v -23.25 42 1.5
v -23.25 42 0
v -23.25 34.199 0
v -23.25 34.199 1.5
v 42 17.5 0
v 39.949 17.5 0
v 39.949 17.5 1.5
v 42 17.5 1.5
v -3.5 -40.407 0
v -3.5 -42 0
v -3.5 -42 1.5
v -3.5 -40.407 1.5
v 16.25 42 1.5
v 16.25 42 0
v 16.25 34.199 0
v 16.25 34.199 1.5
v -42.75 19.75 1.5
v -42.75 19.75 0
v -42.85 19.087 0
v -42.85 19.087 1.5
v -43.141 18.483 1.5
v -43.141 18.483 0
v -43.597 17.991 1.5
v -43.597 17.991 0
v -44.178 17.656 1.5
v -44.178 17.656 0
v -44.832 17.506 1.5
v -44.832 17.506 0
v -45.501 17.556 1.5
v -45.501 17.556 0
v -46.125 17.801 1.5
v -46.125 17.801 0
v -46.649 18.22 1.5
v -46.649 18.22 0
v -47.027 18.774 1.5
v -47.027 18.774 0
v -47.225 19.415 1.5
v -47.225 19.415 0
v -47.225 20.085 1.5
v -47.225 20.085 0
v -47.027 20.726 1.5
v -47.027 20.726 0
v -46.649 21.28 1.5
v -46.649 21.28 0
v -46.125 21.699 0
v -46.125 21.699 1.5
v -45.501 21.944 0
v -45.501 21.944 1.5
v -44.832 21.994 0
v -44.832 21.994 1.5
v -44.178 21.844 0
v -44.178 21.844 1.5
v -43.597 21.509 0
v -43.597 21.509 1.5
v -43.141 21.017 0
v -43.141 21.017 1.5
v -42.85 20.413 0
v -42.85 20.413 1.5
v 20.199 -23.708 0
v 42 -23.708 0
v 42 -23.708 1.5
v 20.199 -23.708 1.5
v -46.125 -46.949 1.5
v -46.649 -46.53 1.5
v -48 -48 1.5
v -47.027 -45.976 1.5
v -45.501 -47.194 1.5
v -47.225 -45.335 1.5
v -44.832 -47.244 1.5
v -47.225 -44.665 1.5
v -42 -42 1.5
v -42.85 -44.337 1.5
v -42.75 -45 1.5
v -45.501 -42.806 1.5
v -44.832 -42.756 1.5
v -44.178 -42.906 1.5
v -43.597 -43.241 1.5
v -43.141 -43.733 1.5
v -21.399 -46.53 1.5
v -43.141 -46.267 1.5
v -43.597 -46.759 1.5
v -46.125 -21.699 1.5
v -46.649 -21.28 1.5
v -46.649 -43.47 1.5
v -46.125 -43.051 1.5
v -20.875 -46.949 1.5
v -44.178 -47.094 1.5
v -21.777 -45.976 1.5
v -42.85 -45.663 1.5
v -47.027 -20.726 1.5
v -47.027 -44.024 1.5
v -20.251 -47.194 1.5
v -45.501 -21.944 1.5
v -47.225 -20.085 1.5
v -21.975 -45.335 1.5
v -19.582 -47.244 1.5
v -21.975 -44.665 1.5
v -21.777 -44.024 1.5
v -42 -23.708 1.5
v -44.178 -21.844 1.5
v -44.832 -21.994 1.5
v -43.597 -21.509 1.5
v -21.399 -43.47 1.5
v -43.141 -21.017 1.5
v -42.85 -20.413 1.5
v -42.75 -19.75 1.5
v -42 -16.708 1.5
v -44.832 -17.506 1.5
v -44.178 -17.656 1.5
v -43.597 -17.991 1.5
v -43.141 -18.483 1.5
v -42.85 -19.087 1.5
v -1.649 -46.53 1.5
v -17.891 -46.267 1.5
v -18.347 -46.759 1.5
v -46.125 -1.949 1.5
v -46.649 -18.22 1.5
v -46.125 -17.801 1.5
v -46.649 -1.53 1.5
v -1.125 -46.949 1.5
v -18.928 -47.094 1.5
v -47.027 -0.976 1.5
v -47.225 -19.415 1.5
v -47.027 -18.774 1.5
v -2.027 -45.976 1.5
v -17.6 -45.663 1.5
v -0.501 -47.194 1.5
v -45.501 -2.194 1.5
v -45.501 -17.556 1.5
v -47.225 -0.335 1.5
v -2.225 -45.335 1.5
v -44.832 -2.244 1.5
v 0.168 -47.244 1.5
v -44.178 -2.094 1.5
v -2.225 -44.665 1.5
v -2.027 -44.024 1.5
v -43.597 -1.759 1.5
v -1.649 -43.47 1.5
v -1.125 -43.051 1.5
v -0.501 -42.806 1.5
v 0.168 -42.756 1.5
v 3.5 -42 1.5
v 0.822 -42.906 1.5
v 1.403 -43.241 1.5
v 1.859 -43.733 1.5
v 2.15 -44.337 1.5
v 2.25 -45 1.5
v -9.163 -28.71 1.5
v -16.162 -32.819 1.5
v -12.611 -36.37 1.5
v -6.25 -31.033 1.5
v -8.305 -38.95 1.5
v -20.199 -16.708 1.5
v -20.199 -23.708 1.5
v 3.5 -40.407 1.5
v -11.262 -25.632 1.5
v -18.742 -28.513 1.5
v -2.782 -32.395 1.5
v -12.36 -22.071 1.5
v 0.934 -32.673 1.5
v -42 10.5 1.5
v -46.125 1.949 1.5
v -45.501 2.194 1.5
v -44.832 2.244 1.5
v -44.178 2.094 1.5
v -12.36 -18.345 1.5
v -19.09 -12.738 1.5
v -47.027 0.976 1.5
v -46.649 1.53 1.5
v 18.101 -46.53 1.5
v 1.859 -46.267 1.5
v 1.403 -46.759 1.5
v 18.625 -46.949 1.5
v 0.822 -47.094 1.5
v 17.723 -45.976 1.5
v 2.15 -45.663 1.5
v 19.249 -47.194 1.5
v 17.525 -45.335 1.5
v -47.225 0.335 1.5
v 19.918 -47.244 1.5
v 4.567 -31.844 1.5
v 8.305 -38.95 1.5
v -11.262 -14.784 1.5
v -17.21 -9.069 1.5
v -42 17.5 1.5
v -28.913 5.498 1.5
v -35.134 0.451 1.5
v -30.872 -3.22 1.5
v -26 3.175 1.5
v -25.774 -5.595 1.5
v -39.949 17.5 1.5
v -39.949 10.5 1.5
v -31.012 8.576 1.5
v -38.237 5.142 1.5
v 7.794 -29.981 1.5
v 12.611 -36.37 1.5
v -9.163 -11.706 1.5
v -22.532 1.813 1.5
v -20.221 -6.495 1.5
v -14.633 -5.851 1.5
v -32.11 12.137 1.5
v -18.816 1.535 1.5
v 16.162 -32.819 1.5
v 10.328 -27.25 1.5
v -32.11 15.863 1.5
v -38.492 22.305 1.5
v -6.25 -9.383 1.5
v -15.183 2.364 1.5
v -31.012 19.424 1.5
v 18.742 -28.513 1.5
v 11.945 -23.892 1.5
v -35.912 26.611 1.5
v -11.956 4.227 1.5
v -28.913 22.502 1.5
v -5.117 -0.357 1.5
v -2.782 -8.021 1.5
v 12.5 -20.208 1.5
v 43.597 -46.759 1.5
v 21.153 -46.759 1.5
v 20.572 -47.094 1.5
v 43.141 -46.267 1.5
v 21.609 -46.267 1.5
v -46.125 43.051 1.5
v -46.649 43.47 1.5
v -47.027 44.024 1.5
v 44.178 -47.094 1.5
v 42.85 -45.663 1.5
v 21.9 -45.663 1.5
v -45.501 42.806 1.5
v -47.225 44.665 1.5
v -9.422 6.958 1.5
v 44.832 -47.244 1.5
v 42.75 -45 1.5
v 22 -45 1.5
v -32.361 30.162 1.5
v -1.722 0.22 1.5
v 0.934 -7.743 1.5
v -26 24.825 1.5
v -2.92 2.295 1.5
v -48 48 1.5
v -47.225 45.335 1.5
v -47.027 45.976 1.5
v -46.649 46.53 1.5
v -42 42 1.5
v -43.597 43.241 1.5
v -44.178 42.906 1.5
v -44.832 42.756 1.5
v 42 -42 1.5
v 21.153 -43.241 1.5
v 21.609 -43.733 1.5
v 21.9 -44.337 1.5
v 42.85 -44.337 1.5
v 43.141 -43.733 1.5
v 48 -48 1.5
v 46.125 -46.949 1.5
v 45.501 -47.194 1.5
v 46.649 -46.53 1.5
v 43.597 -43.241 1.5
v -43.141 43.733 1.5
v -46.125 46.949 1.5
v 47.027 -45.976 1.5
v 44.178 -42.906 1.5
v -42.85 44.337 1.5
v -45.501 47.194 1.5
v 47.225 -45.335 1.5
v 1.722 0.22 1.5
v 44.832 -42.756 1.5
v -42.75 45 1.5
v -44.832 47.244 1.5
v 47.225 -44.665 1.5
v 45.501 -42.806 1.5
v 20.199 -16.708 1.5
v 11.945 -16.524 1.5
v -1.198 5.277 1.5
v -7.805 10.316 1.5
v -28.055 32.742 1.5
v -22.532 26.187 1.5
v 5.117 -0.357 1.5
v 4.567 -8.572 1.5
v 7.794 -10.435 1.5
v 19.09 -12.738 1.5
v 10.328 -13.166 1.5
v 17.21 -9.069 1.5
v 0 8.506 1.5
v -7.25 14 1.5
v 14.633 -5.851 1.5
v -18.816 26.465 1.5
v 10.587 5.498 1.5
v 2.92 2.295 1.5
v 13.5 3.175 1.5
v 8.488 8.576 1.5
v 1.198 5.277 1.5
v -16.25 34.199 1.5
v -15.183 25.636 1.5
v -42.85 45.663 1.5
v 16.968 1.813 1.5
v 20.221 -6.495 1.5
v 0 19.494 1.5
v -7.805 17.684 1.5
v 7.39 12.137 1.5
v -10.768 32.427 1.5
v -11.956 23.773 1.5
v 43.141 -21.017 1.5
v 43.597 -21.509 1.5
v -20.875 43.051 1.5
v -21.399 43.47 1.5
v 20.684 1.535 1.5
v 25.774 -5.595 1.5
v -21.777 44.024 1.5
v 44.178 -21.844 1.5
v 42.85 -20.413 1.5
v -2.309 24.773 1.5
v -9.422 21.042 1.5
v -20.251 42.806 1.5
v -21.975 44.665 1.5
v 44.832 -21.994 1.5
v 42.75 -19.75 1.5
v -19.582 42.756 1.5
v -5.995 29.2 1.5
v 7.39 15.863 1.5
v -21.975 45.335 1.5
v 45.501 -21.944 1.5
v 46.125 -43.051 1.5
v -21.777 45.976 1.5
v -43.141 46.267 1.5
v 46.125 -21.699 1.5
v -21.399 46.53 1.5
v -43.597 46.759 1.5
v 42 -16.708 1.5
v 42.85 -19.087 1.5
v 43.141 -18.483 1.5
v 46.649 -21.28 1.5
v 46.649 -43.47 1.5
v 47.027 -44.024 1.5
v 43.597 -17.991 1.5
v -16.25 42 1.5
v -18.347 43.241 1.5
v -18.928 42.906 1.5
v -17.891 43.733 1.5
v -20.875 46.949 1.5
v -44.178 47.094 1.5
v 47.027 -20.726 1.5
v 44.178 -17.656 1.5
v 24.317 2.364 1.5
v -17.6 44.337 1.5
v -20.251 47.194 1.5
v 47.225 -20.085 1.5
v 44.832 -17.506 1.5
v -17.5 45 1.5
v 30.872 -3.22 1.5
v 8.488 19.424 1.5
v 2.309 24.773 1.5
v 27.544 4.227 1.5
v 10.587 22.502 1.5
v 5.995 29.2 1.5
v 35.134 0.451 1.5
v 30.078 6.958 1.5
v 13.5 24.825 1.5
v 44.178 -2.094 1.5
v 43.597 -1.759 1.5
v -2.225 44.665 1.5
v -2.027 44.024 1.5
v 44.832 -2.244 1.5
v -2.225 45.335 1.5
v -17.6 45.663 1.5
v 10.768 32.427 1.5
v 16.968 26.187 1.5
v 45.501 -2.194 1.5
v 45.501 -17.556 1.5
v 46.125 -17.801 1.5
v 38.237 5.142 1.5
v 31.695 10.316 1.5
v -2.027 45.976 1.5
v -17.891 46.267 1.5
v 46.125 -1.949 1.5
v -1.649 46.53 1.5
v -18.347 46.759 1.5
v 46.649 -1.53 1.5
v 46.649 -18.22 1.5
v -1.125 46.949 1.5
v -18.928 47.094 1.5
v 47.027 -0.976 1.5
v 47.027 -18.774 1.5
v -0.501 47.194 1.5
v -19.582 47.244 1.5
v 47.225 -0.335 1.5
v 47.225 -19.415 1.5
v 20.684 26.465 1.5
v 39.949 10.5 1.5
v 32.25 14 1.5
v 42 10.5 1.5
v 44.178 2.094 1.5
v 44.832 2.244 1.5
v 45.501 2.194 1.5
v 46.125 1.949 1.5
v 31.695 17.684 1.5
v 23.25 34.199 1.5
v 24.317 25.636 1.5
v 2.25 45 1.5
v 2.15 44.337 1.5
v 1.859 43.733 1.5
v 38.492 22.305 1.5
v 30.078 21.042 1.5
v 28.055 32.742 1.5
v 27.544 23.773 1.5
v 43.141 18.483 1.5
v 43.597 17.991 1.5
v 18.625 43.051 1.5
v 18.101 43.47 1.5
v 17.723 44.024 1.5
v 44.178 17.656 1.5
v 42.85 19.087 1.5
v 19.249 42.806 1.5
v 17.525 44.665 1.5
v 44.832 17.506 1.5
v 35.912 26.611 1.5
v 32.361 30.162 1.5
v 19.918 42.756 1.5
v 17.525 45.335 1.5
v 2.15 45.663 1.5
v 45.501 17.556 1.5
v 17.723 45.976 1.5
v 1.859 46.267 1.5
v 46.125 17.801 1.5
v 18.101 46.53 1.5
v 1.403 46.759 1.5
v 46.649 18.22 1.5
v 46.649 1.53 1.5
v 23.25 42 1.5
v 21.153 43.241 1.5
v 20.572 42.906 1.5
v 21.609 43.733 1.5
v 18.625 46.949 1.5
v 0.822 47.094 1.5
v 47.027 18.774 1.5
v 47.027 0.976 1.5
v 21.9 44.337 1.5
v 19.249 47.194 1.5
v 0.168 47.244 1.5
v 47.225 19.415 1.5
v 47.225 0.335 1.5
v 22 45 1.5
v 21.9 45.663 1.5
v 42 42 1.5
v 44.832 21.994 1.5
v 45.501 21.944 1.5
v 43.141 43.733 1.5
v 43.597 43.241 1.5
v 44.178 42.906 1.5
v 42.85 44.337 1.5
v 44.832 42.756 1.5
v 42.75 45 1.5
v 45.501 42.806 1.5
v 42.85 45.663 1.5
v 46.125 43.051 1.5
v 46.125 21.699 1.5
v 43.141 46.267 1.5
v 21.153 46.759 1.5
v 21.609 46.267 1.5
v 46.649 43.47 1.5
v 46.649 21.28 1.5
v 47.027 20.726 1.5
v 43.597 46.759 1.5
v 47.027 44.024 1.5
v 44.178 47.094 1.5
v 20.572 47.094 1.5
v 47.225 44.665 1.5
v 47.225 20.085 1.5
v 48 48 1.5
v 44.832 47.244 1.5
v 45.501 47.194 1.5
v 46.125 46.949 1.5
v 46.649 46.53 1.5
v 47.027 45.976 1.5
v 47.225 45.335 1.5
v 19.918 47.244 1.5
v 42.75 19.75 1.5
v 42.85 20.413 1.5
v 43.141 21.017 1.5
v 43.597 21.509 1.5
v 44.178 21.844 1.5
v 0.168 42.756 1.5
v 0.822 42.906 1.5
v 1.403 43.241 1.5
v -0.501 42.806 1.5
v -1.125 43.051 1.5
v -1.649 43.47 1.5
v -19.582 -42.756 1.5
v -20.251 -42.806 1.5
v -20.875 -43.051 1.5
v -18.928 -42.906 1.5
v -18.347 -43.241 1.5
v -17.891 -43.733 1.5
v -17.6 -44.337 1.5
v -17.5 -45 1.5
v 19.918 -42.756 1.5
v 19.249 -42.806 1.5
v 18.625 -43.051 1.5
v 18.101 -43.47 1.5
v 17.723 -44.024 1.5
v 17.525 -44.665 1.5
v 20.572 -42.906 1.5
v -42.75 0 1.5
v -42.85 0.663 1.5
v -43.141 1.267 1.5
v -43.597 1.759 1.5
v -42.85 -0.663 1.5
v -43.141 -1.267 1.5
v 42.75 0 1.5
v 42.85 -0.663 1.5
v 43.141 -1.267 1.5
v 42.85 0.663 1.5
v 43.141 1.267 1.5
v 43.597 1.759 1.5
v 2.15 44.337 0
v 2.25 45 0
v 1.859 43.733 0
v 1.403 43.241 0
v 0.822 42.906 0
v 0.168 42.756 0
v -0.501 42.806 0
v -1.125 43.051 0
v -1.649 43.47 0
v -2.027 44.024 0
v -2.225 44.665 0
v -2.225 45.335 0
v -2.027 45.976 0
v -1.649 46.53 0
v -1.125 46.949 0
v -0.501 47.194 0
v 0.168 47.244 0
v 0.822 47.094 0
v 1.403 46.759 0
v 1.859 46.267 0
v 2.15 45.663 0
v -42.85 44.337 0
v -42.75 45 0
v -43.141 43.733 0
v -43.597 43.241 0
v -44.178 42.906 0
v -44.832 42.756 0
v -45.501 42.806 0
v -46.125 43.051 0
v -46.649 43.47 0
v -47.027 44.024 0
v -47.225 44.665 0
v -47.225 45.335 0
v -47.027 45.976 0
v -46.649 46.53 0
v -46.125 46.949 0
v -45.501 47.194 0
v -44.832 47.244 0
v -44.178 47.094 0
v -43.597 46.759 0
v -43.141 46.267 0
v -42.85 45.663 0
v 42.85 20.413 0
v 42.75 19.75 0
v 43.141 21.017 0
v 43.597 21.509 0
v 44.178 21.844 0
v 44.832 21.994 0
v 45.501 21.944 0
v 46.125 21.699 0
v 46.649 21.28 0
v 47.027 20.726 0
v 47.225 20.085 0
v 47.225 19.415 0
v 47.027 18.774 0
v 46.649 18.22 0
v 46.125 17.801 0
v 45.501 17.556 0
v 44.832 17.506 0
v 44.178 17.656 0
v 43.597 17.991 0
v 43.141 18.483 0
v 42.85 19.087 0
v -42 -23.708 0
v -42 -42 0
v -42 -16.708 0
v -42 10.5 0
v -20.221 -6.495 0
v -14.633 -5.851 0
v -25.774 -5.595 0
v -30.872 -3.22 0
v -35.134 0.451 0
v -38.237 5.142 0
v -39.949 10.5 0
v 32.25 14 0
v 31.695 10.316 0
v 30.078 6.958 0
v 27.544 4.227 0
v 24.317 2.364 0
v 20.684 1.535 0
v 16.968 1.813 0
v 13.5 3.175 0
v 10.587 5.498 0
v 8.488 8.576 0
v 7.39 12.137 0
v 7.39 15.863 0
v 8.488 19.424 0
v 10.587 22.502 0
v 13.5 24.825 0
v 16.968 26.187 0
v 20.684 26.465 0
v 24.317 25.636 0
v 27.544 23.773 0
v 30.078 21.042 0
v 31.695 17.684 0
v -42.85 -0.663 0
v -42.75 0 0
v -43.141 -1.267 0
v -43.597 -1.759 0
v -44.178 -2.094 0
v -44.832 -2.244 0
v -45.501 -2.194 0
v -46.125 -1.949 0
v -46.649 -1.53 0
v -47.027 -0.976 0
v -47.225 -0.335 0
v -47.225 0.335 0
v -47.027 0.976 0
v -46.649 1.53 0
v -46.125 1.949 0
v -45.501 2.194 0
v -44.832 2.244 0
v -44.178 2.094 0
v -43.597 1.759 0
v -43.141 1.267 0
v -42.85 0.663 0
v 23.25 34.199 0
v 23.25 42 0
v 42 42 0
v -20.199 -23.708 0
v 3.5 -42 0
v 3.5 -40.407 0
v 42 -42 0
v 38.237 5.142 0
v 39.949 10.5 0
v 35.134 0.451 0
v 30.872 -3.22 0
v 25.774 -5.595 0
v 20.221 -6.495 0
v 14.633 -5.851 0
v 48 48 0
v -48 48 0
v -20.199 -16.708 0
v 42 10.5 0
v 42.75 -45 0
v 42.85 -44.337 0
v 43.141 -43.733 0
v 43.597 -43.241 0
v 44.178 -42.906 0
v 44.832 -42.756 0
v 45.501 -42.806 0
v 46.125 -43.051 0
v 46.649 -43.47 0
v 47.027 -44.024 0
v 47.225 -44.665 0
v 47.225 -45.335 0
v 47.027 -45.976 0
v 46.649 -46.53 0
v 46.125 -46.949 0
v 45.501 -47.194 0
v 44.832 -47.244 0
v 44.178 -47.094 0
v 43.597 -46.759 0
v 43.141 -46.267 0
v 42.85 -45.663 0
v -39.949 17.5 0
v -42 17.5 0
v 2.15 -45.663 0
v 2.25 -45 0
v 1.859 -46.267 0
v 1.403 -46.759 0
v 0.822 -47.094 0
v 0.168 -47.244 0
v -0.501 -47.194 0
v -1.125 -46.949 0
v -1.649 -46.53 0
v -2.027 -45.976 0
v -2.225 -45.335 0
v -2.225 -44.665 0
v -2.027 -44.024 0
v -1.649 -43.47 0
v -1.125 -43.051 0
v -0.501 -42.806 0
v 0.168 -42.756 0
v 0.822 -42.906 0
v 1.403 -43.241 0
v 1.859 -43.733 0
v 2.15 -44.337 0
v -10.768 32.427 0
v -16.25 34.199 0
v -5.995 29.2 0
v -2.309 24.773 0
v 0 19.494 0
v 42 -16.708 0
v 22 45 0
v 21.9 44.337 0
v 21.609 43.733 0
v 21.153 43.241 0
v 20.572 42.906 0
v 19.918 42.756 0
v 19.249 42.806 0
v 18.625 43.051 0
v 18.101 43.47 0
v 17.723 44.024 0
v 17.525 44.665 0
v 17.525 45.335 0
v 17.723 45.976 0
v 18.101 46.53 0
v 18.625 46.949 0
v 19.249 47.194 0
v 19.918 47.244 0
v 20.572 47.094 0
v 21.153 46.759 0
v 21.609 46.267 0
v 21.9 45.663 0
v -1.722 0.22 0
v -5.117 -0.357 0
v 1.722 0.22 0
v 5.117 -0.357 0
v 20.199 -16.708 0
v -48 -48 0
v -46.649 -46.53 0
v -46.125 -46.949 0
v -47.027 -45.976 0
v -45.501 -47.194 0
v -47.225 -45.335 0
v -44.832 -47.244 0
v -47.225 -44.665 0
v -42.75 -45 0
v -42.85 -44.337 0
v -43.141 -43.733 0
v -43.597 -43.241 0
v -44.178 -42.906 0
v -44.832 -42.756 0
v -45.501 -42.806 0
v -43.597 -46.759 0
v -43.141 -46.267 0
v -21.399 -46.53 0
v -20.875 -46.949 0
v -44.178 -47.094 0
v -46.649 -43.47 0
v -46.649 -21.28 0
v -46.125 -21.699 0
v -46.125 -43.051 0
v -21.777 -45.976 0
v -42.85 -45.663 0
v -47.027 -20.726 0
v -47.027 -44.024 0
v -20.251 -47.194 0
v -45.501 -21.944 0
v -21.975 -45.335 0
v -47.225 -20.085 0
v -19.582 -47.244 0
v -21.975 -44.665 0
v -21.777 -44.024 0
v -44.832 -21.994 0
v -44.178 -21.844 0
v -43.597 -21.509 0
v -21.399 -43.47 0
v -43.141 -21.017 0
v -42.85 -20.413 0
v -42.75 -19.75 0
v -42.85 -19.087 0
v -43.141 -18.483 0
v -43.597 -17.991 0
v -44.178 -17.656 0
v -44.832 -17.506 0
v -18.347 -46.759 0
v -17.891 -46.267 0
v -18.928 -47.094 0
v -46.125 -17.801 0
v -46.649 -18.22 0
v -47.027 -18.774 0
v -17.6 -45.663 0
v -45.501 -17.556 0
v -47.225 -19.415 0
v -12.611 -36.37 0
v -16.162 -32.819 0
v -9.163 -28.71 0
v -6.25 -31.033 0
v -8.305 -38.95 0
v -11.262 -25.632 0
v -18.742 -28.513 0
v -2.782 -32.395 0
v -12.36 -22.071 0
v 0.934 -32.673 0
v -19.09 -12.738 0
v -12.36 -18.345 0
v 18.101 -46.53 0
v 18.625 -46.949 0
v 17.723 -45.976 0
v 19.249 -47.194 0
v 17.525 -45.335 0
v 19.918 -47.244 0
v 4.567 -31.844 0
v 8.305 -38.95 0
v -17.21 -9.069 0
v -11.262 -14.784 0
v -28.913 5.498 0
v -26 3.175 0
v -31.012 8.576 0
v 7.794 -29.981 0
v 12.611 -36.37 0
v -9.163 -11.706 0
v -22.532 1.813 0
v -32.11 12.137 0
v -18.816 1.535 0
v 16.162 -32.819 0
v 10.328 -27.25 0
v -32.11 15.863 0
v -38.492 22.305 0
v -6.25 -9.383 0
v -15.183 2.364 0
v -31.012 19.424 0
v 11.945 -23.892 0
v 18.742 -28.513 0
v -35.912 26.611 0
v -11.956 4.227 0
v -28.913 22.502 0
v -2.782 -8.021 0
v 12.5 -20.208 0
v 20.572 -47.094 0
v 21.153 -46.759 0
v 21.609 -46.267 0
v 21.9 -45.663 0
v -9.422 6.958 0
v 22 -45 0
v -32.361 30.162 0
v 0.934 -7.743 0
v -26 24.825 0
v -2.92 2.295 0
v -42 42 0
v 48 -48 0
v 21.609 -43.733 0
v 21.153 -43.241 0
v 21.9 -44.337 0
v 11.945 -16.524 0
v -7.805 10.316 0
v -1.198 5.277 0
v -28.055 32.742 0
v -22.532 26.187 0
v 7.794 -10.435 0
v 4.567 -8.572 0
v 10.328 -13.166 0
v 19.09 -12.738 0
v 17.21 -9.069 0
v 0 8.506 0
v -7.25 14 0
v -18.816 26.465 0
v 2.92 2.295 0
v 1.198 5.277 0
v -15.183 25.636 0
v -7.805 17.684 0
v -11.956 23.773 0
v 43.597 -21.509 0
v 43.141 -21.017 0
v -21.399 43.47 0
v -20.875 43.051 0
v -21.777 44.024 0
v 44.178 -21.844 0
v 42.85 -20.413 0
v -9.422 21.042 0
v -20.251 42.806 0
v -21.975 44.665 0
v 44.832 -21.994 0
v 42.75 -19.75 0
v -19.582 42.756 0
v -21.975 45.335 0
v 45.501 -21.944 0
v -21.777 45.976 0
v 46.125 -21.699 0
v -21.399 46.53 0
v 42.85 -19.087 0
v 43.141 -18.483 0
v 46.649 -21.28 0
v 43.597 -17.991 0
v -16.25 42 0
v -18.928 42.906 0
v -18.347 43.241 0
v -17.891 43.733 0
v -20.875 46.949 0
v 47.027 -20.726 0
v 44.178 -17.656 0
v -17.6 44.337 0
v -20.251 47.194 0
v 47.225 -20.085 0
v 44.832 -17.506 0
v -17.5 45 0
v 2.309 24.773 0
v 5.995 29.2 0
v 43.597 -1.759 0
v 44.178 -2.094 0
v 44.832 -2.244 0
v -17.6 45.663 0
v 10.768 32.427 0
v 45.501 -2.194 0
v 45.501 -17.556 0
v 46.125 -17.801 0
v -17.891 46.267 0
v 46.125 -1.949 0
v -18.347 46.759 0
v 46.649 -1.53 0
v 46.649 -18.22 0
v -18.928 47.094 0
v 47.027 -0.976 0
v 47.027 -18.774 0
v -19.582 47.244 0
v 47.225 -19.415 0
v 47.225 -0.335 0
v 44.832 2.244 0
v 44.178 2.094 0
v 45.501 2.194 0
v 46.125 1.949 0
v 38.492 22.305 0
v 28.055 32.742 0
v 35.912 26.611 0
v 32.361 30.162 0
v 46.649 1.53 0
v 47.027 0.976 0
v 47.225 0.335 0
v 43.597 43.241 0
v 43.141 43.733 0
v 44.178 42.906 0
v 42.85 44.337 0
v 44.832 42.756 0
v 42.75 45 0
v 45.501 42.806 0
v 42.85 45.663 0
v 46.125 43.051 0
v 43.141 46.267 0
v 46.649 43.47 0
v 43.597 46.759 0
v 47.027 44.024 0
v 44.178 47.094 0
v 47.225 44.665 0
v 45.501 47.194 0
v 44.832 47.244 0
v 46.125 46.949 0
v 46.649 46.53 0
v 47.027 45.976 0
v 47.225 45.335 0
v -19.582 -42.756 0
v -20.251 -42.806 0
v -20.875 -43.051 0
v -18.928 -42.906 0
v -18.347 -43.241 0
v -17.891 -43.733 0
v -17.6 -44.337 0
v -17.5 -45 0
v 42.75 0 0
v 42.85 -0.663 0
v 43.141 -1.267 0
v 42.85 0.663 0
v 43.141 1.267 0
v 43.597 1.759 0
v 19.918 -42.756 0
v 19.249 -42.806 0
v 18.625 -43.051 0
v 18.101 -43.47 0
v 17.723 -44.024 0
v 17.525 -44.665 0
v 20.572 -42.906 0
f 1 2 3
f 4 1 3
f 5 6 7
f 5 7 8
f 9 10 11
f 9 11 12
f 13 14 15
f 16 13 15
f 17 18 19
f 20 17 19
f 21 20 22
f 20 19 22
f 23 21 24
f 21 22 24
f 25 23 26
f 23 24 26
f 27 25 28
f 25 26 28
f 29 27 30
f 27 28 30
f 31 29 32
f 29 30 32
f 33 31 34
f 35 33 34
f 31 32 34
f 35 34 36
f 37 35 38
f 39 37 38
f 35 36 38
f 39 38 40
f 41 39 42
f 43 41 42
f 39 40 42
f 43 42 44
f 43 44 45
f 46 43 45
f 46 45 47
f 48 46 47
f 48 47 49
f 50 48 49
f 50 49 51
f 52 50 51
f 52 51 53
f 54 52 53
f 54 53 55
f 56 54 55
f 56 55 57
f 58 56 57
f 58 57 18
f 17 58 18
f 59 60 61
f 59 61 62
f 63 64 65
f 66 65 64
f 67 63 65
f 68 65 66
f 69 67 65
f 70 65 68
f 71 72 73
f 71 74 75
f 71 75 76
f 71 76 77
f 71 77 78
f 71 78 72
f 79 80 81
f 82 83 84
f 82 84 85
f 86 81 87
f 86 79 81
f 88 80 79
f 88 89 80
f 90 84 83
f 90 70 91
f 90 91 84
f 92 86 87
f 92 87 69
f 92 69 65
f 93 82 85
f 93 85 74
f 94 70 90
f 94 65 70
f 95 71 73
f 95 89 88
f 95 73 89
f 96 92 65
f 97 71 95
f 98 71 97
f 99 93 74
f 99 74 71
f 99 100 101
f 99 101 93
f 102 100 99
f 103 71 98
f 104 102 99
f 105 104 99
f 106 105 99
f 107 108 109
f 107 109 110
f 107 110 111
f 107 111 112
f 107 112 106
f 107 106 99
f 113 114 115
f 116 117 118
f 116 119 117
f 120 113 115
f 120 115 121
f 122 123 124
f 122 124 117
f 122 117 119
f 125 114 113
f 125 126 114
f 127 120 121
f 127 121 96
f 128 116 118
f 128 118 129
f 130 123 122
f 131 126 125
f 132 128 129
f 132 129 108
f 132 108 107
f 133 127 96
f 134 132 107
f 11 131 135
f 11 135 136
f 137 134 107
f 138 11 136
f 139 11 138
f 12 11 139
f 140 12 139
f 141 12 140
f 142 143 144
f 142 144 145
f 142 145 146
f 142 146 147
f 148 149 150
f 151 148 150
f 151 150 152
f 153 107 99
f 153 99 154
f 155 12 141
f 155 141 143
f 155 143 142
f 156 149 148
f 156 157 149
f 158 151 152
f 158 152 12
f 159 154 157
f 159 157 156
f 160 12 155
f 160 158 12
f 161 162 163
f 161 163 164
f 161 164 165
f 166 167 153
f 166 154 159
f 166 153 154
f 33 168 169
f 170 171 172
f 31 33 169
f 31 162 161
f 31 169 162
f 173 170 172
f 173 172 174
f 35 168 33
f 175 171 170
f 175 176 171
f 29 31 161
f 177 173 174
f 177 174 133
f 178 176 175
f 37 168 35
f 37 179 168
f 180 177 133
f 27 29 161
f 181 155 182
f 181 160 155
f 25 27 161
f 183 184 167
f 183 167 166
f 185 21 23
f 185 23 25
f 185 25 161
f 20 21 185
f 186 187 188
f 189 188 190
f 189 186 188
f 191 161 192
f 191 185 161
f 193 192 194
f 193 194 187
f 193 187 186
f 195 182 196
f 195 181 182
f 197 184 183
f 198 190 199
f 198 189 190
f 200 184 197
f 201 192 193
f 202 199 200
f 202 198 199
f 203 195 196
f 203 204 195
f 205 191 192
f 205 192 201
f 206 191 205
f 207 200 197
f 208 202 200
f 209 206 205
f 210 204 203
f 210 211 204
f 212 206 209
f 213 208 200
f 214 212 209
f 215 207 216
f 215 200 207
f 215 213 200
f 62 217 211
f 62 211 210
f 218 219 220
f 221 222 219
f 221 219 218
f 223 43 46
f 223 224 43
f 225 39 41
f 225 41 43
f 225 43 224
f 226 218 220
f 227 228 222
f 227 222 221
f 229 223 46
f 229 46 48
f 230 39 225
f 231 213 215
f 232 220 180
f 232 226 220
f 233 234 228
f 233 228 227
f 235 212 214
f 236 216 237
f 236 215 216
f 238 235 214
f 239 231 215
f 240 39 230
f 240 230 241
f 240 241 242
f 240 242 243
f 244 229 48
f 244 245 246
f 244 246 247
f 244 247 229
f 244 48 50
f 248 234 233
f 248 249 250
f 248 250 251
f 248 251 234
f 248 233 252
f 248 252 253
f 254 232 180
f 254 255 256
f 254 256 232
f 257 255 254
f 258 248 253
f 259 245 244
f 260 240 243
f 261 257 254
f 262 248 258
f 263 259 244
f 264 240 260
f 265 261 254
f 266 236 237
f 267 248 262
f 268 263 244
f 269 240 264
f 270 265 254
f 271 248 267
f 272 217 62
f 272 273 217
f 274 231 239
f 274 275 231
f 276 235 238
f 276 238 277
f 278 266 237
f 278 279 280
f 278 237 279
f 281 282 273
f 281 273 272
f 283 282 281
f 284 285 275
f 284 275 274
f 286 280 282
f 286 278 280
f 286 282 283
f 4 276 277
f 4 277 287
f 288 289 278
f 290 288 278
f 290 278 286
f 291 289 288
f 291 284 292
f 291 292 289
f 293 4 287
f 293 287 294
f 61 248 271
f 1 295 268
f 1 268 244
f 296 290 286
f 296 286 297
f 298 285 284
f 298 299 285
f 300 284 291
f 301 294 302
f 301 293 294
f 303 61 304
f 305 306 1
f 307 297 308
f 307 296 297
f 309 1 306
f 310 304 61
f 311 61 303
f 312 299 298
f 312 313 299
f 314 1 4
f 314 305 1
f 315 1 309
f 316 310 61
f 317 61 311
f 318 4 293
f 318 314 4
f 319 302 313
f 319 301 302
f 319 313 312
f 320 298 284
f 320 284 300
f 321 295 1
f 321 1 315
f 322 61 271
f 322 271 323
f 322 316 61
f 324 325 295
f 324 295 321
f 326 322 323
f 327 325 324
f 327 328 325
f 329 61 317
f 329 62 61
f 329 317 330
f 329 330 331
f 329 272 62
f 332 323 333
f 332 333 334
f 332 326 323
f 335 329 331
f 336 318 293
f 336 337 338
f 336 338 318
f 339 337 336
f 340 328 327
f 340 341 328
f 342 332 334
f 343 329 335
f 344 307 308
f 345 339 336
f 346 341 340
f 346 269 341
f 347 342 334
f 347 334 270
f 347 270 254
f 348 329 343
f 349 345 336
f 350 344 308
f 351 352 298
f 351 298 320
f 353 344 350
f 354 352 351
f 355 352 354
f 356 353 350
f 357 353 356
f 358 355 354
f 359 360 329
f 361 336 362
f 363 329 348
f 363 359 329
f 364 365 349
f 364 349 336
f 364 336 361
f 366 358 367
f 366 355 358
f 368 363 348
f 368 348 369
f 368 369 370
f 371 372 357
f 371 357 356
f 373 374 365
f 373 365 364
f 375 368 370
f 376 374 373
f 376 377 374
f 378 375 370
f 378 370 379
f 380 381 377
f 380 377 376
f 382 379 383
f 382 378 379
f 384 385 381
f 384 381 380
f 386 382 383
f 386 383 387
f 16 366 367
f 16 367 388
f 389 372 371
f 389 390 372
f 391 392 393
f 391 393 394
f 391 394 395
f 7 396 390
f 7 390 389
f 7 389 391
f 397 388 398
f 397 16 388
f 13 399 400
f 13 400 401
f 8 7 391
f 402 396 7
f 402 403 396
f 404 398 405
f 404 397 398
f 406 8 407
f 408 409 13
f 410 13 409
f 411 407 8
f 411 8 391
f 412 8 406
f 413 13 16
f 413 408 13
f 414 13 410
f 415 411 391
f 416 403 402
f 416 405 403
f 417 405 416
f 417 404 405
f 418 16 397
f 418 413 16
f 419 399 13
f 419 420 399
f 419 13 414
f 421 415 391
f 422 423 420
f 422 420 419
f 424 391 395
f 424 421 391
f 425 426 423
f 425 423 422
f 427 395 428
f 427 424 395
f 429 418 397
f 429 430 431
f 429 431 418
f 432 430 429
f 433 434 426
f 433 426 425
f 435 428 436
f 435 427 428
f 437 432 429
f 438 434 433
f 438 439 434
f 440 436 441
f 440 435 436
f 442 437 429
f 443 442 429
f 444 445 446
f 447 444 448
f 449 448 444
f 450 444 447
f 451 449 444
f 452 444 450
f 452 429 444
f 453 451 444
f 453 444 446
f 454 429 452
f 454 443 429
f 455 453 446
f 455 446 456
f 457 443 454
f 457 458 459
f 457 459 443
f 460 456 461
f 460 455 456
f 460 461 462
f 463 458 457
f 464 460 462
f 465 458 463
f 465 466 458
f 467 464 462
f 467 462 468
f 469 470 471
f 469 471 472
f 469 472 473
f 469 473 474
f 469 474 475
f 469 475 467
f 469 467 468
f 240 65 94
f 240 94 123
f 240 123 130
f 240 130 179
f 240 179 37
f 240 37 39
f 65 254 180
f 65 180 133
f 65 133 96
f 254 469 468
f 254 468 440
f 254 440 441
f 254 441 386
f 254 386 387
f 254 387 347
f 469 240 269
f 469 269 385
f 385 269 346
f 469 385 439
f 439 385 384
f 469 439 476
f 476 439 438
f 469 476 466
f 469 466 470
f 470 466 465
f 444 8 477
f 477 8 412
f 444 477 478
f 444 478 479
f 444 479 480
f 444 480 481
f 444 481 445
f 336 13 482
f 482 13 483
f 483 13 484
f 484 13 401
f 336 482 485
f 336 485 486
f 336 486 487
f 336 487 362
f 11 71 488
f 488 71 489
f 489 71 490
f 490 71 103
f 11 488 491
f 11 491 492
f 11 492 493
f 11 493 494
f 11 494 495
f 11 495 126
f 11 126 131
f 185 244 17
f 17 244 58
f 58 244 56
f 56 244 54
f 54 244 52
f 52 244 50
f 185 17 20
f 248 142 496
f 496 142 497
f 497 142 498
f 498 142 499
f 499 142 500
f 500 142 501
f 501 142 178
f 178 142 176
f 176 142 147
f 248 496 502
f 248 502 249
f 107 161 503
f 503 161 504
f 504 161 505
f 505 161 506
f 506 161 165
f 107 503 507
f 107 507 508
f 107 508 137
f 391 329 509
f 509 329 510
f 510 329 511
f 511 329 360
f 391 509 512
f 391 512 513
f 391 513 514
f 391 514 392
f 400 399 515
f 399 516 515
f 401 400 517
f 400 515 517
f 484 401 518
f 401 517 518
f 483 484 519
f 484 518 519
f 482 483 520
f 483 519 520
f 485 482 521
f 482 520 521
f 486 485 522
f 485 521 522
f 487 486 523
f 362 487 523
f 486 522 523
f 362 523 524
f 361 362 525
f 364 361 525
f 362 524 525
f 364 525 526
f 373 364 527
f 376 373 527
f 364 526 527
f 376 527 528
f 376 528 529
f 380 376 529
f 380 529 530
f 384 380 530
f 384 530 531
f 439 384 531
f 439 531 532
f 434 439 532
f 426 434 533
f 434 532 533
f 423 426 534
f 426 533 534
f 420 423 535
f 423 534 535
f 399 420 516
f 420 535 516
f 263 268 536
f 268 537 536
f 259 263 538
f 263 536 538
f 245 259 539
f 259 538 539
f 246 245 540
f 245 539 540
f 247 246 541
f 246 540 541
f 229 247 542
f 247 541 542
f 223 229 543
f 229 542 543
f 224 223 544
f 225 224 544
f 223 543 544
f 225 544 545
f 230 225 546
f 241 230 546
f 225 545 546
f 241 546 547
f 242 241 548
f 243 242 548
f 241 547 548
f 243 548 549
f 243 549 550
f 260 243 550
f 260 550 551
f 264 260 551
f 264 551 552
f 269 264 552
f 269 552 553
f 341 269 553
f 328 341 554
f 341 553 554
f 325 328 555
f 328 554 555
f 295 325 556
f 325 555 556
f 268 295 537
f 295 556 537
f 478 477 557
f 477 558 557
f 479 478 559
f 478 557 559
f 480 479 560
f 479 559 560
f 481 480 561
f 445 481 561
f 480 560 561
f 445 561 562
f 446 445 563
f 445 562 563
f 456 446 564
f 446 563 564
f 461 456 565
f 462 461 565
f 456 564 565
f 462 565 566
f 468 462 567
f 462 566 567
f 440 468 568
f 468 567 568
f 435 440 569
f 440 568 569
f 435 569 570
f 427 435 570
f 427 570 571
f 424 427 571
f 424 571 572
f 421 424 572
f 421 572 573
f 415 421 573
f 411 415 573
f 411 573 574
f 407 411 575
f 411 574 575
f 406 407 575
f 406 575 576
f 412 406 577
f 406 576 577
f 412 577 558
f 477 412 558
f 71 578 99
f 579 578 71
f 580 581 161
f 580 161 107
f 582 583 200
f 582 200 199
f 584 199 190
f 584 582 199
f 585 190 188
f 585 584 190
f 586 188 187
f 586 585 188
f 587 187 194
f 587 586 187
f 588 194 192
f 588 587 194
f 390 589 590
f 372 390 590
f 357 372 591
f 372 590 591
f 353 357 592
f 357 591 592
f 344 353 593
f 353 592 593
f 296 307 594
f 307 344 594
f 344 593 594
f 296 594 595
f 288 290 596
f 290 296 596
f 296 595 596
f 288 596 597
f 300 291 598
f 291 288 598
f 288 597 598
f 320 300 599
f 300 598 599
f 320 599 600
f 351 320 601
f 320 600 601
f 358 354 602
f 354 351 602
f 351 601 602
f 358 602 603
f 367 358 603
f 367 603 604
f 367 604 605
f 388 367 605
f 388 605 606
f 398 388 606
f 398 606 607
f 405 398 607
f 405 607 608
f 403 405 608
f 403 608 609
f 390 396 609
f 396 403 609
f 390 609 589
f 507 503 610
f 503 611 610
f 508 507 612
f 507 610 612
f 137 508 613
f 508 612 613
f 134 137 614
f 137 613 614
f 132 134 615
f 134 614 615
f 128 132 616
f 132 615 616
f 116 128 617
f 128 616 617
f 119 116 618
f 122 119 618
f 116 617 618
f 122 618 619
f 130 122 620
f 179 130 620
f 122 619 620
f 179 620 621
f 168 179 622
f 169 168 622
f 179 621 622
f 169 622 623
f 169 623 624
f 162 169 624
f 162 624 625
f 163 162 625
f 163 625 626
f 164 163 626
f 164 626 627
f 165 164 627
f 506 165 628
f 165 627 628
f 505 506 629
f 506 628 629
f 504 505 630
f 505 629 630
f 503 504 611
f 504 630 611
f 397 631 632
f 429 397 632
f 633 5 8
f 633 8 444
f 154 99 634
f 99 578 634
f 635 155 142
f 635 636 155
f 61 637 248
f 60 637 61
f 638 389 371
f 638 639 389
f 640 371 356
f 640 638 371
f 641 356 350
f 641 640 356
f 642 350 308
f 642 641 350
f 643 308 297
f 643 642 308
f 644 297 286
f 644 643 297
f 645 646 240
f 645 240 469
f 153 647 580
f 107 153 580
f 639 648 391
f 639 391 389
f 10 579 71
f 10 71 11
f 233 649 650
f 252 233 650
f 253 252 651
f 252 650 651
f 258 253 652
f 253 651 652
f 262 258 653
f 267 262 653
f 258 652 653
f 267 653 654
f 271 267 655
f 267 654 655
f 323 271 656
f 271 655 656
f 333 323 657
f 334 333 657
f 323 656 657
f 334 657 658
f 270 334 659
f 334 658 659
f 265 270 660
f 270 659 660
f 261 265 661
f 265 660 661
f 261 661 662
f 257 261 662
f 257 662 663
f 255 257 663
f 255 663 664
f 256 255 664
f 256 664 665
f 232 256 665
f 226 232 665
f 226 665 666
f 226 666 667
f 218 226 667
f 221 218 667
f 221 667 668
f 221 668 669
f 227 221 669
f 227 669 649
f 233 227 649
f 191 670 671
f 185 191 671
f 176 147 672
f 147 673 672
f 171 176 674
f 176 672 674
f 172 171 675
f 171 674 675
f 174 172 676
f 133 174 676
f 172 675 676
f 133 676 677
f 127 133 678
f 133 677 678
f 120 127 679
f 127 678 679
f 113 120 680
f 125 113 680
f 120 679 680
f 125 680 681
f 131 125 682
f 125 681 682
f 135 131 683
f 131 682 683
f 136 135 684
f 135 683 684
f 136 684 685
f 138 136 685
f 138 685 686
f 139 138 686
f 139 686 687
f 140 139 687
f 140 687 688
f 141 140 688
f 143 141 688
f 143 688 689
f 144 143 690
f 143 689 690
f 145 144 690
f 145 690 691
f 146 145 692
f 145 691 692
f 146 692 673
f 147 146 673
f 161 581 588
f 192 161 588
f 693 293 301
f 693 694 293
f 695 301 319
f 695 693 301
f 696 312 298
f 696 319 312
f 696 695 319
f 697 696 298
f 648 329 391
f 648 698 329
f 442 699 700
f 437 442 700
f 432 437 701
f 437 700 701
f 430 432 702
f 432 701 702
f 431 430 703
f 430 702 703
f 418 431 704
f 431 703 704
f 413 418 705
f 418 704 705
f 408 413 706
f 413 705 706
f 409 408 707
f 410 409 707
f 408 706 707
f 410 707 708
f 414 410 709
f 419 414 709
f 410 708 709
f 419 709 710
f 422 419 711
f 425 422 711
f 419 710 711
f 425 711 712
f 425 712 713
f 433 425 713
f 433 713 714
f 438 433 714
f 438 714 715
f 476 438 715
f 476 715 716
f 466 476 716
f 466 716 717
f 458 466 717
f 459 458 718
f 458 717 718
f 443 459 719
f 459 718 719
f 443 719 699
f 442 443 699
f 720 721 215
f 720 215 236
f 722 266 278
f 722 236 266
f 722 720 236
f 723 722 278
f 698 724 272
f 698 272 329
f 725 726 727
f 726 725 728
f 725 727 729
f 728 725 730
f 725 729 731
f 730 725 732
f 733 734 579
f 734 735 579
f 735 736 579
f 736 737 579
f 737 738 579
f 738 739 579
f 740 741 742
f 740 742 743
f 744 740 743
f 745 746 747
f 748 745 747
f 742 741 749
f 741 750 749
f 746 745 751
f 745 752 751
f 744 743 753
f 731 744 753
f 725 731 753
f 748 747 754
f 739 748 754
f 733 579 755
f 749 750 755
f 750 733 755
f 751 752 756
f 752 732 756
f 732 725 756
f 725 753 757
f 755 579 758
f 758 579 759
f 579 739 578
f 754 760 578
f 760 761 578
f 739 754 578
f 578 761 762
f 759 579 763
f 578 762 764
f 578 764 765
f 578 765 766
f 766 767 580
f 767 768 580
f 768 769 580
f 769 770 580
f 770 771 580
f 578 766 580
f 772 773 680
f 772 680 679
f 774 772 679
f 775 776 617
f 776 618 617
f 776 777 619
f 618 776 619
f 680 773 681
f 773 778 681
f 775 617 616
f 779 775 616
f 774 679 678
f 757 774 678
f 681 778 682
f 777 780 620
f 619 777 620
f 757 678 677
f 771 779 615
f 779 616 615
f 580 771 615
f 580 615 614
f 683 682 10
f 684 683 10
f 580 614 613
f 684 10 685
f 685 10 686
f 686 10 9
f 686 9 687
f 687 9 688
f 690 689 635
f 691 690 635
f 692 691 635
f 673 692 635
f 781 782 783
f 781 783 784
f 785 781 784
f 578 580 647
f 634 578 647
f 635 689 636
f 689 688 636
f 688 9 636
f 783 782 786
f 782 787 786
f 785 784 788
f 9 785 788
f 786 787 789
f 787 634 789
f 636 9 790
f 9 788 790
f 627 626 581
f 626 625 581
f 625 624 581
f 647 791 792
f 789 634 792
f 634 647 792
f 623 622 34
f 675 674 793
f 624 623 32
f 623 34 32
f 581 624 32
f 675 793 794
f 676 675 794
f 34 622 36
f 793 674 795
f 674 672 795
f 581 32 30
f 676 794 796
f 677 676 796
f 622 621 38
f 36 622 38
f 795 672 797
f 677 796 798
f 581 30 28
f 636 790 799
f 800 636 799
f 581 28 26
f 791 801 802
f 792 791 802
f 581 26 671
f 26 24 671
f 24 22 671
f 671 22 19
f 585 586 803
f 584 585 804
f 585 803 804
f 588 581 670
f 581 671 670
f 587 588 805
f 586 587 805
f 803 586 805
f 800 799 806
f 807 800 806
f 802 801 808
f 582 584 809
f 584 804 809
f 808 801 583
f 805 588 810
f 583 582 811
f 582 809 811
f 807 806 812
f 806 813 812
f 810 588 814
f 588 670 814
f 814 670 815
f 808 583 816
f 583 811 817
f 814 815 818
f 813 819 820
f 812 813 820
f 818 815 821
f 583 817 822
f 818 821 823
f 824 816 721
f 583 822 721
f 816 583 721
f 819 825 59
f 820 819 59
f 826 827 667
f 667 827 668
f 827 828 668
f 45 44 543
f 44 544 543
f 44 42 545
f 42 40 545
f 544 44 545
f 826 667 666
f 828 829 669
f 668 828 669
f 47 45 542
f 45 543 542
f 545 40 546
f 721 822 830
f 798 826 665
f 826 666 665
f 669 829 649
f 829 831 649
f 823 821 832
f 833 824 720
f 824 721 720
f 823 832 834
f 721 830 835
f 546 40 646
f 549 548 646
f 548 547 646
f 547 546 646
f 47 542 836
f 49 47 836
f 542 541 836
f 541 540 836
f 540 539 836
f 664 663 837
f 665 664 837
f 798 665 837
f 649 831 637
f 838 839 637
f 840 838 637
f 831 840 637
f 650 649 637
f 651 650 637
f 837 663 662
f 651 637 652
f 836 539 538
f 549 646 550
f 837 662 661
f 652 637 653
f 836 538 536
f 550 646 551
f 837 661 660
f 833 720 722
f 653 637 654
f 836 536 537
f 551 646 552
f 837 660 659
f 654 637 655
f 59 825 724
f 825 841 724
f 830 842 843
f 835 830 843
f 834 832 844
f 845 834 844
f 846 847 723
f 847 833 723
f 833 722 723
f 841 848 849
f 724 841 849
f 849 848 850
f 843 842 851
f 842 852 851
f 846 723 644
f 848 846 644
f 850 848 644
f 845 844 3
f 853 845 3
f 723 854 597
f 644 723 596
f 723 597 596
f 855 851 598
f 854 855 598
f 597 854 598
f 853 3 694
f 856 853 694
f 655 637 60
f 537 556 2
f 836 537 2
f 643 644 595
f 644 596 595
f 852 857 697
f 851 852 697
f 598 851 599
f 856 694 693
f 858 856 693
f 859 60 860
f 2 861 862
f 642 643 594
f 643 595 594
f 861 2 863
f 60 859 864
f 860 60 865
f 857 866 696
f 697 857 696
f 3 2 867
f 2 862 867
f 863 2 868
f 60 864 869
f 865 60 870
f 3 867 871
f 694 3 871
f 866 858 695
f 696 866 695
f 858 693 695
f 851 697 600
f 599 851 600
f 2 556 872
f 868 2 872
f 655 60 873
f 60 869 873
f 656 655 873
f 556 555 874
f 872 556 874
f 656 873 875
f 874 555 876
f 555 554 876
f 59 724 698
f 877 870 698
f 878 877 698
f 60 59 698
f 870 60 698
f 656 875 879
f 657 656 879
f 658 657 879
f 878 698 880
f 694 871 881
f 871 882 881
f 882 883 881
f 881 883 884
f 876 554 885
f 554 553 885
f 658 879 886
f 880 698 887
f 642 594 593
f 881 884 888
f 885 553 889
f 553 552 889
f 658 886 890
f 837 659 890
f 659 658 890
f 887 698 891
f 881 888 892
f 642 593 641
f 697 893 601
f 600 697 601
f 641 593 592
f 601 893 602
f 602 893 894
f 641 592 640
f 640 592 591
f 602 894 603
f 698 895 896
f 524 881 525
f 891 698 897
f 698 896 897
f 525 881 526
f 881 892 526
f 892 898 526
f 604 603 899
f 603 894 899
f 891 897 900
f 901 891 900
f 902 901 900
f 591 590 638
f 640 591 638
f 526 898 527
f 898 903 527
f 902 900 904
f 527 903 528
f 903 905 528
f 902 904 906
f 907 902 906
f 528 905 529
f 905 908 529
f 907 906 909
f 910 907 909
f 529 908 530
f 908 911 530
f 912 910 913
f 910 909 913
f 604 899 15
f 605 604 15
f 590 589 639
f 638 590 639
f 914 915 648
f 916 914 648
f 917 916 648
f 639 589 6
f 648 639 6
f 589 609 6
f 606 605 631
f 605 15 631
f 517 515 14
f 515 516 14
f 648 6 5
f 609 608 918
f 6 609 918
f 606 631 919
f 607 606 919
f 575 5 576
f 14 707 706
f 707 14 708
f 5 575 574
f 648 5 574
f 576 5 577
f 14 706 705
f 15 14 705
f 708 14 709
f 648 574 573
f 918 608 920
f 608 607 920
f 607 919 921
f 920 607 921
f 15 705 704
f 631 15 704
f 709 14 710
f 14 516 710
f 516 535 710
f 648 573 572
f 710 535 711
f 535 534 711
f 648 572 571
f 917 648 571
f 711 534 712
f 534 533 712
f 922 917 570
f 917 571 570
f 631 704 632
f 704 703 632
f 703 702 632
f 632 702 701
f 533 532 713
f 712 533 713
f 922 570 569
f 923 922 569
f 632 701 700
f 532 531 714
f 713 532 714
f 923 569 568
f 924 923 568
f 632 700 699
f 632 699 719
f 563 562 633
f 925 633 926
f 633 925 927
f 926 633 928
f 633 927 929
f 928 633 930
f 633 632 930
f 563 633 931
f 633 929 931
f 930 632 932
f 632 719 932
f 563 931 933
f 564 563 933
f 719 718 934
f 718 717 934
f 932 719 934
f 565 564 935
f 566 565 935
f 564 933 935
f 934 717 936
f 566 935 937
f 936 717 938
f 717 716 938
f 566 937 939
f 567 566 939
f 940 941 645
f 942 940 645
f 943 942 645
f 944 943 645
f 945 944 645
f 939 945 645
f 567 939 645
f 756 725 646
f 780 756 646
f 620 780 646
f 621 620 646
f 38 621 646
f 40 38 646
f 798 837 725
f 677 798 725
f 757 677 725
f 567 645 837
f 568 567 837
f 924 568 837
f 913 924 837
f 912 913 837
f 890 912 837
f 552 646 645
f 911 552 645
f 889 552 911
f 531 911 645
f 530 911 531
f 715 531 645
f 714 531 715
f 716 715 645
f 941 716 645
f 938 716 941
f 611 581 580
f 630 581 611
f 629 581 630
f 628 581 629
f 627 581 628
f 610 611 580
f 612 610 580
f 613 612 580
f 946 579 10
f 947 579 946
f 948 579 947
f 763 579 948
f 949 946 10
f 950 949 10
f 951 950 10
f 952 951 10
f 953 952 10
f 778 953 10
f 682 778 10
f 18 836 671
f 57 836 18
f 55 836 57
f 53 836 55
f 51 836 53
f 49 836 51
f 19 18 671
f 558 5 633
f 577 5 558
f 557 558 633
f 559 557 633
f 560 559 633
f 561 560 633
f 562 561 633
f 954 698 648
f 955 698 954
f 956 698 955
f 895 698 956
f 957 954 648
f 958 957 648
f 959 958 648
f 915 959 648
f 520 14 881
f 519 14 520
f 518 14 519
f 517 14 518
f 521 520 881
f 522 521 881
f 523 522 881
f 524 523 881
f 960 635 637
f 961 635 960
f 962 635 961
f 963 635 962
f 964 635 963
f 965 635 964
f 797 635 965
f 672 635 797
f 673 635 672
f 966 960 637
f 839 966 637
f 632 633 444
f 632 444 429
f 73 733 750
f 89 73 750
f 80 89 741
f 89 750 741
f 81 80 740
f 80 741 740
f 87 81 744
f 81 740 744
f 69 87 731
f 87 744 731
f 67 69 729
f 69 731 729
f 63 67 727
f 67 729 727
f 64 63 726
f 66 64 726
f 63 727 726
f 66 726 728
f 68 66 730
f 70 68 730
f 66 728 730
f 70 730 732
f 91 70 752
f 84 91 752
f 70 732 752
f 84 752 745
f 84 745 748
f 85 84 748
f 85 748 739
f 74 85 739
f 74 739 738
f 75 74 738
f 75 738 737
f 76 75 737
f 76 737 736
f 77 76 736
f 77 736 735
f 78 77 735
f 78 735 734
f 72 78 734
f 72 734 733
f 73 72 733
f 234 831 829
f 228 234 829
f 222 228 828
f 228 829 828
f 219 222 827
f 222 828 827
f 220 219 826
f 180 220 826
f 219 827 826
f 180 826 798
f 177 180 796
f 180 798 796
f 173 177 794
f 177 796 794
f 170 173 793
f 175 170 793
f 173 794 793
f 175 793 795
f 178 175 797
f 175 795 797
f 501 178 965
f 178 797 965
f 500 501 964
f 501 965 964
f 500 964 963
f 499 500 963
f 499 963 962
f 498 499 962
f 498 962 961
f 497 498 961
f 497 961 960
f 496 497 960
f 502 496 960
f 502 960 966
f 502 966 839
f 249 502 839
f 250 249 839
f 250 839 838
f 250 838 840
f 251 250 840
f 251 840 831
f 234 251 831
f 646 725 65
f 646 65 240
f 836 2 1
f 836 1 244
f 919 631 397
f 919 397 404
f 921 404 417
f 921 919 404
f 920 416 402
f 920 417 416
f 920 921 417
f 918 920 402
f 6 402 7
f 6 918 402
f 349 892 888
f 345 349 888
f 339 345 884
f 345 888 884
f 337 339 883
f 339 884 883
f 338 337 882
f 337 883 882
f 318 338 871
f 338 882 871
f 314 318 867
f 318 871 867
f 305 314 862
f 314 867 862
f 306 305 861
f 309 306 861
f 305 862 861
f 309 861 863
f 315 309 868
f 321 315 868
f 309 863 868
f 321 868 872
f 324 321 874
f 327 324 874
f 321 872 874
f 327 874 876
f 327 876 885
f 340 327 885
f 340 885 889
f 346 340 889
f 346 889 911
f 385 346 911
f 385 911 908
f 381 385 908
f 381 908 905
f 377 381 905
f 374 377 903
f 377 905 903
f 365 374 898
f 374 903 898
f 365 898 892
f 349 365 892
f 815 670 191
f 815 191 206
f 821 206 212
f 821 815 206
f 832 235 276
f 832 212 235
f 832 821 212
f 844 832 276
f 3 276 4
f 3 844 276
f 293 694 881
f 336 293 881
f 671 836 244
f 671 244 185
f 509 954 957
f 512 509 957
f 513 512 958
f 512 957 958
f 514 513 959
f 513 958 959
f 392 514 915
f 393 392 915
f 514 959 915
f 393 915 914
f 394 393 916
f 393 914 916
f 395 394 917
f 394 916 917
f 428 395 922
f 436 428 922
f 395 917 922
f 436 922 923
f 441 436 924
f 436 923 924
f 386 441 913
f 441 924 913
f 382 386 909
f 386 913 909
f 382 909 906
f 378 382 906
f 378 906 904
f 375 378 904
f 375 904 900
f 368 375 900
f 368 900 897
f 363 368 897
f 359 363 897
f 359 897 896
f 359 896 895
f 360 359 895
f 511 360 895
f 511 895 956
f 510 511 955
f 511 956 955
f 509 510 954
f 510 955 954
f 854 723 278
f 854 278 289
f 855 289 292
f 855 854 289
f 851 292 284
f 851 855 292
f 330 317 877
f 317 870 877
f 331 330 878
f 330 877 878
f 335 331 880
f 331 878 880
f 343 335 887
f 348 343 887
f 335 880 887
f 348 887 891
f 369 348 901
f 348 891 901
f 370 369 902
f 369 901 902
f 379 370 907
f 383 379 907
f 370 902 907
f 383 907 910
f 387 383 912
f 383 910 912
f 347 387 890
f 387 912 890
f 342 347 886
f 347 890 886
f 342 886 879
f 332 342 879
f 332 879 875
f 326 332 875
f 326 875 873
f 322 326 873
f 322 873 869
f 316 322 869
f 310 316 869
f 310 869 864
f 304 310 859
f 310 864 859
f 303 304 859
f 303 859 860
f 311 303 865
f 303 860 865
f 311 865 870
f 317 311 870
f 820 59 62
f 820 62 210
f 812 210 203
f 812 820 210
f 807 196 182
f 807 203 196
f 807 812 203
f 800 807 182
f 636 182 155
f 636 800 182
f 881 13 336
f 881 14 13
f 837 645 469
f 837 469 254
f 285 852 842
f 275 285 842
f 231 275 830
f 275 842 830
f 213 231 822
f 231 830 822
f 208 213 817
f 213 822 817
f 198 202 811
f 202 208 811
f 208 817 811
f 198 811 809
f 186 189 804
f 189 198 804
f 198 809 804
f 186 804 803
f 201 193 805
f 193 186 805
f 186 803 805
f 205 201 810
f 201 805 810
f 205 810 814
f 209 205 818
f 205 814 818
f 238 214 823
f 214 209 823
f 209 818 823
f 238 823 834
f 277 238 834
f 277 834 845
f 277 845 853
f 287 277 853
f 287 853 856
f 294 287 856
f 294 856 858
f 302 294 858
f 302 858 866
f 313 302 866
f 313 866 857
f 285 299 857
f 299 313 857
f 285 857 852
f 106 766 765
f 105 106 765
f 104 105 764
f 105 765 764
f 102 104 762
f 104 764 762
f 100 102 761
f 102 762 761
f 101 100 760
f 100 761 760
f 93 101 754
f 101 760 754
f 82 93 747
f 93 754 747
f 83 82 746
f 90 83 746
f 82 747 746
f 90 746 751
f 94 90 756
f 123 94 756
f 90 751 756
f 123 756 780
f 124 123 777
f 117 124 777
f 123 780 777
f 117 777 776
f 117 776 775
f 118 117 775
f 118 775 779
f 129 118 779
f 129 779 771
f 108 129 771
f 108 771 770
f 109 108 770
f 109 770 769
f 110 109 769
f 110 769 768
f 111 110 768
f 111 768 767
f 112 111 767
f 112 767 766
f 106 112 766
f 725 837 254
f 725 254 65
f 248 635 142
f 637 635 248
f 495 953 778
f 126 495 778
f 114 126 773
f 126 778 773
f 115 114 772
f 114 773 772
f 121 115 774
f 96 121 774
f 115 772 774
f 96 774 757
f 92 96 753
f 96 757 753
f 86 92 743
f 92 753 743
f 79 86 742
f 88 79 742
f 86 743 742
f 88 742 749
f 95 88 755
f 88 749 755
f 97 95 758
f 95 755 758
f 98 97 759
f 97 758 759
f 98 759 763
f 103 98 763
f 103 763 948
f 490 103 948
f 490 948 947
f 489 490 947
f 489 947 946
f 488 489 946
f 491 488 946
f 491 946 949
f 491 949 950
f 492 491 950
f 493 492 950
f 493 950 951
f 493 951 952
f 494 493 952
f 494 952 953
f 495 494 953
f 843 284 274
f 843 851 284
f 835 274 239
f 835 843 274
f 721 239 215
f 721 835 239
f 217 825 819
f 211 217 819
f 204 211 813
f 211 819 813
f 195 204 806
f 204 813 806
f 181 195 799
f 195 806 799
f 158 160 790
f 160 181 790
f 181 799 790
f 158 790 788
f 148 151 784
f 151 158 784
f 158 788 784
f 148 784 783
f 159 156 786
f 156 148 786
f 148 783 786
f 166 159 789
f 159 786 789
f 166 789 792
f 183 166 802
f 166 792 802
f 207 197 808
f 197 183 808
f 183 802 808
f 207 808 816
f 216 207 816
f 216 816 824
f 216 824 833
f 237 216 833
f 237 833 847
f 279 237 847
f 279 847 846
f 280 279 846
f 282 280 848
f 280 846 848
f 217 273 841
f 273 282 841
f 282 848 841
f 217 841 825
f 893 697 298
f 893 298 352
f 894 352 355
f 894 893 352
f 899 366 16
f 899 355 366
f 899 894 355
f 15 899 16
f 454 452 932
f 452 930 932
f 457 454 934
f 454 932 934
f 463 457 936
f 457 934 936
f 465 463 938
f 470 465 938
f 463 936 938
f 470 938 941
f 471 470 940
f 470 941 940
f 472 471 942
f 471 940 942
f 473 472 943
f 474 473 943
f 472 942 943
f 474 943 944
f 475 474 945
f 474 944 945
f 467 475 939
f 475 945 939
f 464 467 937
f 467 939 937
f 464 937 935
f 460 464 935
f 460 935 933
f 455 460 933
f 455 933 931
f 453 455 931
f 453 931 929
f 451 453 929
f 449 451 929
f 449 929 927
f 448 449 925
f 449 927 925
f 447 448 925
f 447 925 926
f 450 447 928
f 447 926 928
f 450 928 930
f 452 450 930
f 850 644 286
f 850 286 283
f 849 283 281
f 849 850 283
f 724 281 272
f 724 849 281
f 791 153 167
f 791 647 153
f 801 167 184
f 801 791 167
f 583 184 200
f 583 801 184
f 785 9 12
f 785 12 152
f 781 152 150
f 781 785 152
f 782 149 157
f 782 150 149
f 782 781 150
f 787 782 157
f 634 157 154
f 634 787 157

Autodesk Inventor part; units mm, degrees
ref_plane "YZ Plane" through (0, 0, 0) normal (1, 0, 0) x (0, 1, 0)
ref_plane "XZ Plane" through (0, 0, 0) normal (0, 1, 0) x (-1, 0, 0)
ref_plane "XY Plane" through (0, 0, 0) normal (0, 0, 1) x (1, 0, 0)
sketch "Sketch1" plane through (0, 0, 0) normal (0, 0, 1) x (1, 0, 0)
  line L0 (-48, 48) -> (48, 48)
  line L1 (48, 48) -> (48, -48)
  line L2 (48, -48) -> (-48, -48)
  line L3 (-48, -48) -> (-48, 48)
  line L4 (42, 42) -> (-42, 42)
  line L5 (-42, 42) -> (-42, -42)
  line L6 (-42, -42) -> (42, -42)
  line L7 (42, -42) -> (42, 42)
  line L8 (0, 152.7233) -> (0, -72.1628) construction
  line L9 (-77.8847, 0) -> (88.8171, 0) construction
  line L10 (-48, 45) -> (48, 45) construction
  circle A0 centre (0, 45) radius 2.25
  circle A1 centre (-19.75, 45) radius 2.25
  circle A2 centre (19.75, 45) radius 2.25
  line L11 (-45, 48) -> (-45, -48) construction
  circle A3 centre (-45, 45) radius 2.25
  circle A4 centre (-45, 0) radius 2.25
  line L12 (-48, -45) -> (48, -45) construction
  circle A5 centre (-45, -45) radius 2.25
  circle A6 centre (-45, 19.75) radius 2.25
  circle A7 centre (-45, -19.75) radius 2.25
  line L13 (0, -20.208) -> (-19.75, 14) construction
  line L14 (-19.75, 14) -> (19.75, 14) construction
  line L15 (19.75, 14) -> (0, -20.208) construction
  circle A8 centre (19.75, 14) radius 12.5
  circle A9 centre (-19.75, 14) radius 12.5
  circle A10 centre (0, -20.208) radius 12.5
  circle A11 centre (-19.75, 14) radius 20.5
  circle A12 centre (19.75, 14) radius 20.5
  circle A13 centre (0, -20.208) radius 20.5
  line L16 (-23.25, 30.0471) -> (-16.25, 30.0471)
  line L17 (-16.25, 30.0471) -> (-16.25, 42)
  line L18 (-16.25, 42) -> (-23.25, 42)
  line L19 (-23.25, 42) -> (-23.25, 30.0471)
  line L20 (16.25, 30.0471) -> (23.25, 30.0471)
  line L21 (23.25, 30.0471) -> (23.25, 42)
  line L22 (23.25, 42) -> (16.25, 42)
  line L23 (16.25, 42) -> (16.25, 30.0471)
  line L24 (-35.3273, 17.5) -> (-42, 17.5)
  line L25 (-42, 17.5) -> (-42, 10.5)
  line L26 (-42, 10.5) -> (-35.3273, 10.5)
  line L27 (-35.3273, 10.5) -> (-35.3273, 17.5)
  line L28 (34.9738, 17.5) -> (42, 17.5)
  line L29 (42, 17.5) -> (42, 10.5)
  line L30 (42, 10.5) -> (34.9738, 10.5)
  line L31 (34.9738, 10.5) -> (34.9738, 17.5)
  line L32 (-3.5, -36.2367) -> (3.5, -36.2367)
  line L33 (3.5, -36.2367) -> (3.5, -42)
  line L34 (3.5, -42) -> (-3.5, -42)
  line L35 (-3.5, -42) -> (-3.5, -36.2367)
  line L36 (-16.3125, -16.708) -> (-42, -16.708)
  line L37 (-42, -16.708) -> (-42, -23.708)
  line L38 (-42, -23.708) -> (-16.3125, -23.708)
  line L39 (-16.3125, -23.708) -> (-16.3125, -16.708)
  line L40 (16.0929, -16.708) -> (42, -16.708)
  line L41 (42, -16.708) -> (42, -23.708)
  line L42 (42, -23.708) -> (16.0929, -23.708)
  line L43 (16.0929, -23.708) -> (16.0929, -16.708)
  point P0 (0, 0)
  point P1 (0, 48)
  point P2 (48, 0)
  point P3 (0, 2.5973)
  point P4 (-16.3125, -20.208)
  point P5 (16.0929, -20.208)
  point P6 (34.9738, 14)
  point P7 (-35.3273, 14)
  point P8 (-19.75, 30.0471)
  point P9 (19.75, 30.0471)
  point P10 (0, -36.2367)
  dimension "d0" = 96
  dimension "d1" = 96
  dimension "d2" = 6
  dimension "d5" = 3
  dimension "d6" = 4.5
  dimension "d7" = 4.5
  dimension "d8" = 4.5
  dimension "d9" = 22
  dimension "d10" = 22
  dimension "d11" = 3
  dimension "d12" = 4.5
  dimension "d13" = 4.5
  dimension "d14" = 3
  dimension "d15" = 4.5
  dimension "d31" = 4.5
  dimension "d32" = 4.5
  dimension "d33" = 22
  dimension "d34" = 22
  dimension "d53" = 28
  dimension "d54" = 25
  dimension "d55" = 25
  dimension "d56" = 25
  dimension "d65" = 8
  dimension "d66" = 8
  dimension "d67" = 8
  dimension "d68" = 7
  dimension "d69" = 7
  dimension "d70" = 7
  dimension "d71" = 7
  dimension "d72" = 7
  dimension "d73" = 7
  dimension "d74" = 7
extrude "Extrusion1" add sketch "Sketch1" along normal blind 1.5 contours L0 L1 L2 L3 | L21 A12 L23 L4 | L7 L30 A12 L28 | L21 L20 L23 A12 | A12 L28 L31 L30 A13 A11 L23 L20 L21 | A12 L30 L31 L28 | L17 A11 L19 L4 | L7 L42 A13 L40 | L17 L16 L19 A11 | A11 A12 A13 L26 L27 L24 L19 L16 L17 | A11 A12 | L40 L43 L42 A13 L33 L32 L35 L38 L39 L36 A11 A12 | A13 L42 L43 L40 | A12 A13 | L24 A11 L26 L5 | L24 L27 L26 A11 | A11 A13 | L6 L35 A13 L33 | A13 L35 L32 L33 | L36 A13 L38 L5 | L36 L39 L38 A13 | A0 | A1 | A2 | A3 | A4 | A5 | A6 | A7
extrude "Extrusion2" cut sketch "Sketch1" along normal blind 10 contours A0 | A1 | A2
mirror "Mirror1" about plane through (0, 0, 0) normal (0, 1, 0) of "Extrusion2"
extrude "Extrusion3" cut sketch "Sketch1" along normal blind 10 contours A3 | A4 | A5 | A6 | A7
mirror "Mirror2" about plane through (0, 0, 0) normal (1, 0, 0) of "Extrusion3"
properties part number "Base"
